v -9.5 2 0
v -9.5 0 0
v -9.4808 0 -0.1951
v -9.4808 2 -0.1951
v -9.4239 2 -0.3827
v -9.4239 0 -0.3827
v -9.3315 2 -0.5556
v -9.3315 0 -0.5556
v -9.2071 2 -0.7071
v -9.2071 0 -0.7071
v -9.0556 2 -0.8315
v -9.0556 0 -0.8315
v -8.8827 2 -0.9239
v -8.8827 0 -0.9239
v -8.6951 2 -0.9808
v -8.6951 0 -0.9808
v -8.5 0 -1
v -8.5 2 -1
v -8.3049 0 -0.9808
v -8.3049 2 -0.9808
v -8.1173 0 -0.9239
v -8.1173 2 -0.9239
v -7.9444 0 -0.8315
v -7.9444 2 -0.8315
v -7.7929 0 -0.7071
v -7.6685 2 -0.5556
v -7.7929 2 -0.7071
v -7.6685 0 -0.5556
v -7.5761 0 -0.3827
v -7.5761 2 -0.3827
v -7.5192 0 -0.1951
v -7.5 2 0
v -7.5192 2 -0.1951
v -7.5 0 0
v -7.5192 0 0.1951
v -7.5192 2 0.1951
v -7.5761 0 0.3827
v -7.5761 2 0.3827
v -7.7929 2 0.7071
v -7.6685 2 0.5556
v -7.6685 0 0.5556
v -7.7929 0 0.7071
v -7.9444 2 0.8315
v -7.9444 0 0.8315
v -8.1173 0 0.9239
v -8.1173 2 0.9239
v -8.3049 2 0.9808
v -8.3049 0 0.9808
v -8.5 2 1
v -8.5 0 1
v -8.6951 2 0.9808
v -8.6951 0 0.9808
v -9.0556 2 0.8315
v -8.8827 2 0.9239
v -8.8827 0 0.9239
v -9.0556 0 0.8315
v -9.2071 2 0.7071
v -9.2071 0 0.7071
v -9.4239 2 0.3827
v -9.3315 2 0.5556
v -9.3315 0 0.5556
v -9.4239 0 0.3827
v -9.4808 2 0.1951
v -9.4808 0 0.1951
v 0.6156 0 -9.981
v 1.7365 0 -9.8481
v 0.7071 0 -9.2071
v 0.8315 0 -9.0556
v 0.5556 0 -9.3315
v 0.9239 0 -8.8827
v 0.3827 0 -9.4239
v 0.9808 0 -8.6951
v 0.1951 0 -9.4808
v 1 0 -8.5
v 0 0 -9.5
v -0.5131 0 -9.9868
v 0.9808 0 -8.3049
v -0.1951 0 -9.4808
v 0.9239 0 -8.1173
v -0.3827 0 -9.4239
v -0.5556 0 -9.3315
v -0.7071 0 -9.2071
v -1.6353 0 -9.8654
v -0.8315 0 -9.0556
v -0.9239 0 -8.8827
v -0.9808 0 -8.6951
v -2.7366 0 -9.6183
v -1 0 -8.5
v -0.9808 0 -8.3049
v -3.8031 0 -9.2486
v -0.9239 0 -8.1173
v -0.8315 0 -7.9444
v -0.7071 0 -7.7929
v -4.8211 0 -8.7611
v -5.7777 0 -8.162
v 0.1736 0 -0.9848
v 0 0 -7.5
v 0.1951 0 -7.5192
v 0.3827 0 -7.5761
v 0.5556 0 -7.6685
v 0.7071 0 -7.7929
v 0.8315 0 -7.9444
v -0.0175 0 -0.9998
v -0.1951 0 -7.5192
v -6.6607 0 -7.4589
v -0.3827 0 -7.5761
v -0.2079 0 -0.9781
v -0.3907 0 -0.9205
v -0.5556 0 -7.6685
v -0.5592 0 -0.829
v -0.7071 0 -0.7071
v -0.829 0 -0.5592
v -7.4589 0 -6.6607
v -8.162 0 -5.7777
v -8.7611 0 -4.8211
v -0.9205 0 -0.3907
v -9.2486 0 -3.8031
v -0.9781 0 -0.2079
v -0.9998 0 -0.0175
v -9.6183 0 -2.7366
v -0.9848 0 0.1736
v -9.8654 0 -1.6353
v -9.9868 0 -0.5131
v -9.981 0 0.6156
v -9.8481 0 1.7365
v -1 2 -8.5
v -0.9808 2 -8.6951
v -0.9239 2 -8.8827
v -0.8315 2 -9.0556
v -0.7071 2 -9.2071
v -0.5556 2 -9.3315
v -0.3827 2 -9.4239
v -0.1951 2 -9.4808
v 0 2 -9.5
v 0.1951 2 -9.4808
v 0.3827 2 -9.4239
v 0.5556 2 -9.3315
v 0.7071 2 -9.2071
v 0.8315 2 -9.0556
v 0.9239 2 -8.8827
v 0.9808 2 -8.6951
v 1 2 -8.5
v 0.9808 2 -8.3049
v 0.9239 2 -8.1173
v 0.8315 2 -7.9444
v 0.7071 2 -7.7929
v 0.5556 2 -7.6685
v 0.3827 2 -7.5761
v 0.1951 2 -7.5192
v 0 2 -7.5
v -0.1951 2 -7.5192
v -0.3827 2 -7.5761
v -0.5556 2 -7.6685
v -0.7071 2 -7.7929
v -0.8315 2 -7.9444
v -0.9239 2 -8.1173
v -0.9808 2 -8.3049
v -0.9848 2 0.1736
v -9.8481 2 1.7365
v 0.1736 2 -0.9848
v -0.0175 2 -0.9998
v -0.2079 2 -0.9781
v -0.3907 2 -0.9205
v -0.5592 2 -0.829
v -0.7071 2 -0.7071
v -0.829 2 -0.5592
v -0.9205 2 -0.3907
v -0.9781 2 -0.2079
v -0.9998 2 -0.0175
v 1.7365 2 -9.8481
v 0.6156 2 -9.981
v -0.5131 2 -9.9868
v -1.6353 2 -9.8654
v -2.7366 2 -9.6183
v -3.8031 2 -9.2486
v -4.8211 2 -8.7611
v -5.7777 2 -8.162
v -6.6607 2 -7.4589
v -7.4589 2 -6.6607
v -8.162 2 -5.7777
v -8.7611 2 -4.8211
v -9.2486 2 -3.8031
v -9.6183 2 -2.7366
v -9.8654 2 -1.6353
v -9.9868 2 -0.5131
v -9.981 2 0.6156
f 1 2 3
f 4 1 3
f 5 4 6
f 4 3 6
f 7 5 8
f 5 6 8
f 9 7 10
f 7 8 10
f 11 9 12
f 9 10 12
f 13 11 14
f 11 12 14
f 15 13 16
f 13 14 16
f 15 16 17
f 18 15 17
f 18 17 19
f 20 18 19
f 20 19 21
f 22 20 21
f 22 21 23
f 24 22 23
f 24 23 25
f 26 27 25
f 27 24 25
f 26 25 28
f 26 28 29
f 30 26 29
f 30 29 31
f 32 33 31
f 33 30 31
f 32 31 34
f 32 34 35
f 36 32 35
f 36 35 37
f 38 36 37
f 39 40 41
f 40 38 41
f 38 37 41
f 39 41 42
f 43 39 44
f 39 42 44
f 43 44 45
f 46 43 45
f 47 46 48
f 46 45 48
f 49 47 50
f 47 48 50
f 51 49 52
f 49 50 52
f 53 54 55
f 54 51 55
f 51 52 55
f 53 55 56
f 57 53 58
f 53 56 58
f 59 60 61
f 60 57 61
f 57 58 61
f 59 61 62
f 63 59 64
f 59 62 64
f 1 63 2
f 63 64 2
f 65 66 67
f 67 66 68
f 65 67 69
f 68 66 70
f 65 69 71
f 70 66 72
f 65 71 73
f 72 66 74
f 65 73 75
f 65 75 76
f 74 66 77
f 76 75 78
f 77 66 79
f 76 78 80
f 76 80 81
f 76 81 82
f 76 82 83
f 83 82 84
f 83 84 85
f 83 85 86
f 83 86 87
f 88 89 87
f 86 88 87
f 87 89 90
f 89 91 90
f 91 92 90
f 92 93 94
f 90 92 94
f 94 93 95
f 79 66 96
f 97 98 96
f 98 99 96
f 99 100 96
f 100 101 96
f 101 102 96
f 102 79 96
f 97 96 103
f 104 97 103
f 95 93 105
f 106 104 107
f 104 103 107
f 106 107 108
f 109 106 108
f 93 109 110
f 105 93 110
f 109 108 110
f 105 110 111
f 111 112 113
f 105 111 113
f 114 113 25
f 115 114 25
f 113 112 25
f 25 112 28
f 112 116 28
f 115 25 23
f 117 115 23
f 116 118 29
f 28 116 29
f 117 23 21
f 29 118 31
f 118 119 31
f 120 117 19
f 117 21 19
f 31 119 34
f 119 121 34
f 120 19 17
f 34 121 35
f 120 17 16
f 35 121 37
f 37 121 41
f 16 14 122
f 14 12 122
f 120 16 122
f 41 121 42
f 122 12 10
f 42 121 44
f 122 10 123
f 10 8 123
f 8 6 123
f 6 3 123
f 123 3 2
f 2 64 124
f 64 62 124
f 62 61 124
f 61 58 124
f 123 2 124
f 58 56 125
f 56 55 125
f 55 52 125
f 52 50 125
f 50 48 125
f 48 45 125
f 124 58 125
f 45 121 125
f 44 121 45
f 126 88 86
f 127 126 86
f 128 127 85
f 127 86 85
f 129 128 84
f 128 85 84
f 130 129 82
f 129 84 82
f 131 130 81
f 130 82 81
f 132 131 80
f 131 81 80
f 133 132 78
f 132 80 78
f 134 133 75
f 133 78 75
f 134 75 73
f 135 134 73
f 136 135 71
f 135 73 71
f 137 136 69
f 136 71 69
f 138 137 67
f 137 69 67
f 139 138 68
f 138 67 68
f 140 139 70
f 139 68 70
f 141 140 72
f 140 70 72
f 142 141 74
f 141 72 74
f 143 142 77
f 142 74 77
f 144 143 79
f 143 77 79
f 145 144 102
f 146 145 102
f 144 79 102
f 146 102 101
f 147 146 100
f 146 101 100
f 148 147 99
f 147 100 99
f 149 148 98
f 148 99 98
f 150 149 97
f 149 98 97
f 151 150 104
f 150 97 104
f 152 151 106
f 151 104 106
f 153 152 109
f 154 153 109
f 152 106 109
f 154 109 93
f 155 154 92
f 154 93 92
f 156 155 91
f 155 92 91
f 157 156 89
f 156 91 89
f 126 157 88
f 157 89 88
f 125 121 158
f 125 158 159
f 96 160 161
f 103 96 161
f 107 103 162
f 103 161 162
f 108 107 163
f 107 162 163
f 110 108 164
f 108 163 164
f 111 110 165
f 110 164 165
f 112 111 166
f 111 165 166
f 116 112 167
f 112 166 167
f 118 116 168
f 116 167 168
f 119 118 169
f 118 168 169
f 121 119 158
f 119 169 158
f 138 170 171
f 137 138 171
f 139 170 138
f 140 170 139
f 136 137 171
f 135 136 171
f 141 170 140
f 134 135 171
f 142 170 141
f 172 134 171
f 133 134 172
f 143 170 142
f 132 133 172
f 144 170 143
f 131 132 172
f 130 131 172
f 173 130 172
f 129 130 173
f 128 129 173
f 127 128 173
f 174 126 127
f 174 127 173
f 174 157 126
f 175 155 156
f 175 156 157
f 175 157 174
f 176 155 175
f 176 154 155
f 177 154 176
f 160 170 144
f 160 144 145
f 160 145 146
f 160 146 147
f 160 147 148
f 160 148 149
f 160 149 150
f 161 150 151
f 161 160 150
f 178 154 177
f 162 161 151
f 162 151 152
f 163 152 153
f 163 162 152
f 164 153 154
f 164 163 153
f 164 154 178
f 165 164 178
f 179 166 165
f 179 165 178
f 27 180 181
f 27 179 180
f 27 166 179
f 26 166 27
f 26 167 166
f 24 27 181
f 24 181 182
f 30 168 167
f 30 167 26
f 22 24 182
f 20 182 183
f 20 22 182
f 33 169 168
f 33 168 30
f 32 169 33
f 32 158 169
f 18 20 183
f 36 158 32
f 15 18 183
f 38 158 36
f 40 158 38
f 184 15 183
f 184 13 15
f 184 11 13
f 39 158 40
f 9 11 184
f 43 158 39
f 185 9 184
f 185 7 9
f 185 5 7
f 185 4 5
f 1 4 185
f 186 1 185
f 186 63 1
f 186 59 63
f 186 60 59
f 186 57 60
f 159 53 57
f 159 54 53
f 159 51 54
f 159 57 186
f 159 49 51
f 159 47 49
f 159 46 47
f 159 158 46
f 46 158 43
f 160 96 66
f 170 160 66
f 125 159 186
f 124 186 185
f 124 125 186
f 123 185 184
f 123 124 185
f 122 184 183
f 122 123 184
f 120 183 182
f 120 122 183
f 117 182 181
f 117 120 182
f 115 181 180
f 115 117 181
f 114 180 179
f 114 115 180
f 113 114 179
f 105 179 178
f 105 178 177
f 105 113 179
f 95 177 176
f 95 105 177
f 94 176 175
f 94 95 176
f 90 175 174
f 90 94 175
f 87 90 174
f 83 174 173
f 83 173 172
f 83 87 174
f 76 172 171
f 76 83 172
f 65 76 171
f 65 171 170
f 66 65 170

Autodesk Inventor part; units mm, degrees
ref_plane "YZ Plane" through (0, 0, 0) normal (1, 0, 0) x (0, 1, 0)
ref_plane "XZ Plane" through (0, 0, 0) normal (0, 1, 0) x (-1, 0, 0)
ref_plane "XY Plane" through (0, 0, 0) normal (0, 0, 1) x (1, 0, 0)
sketch "Sketch1" plane through (0, 0, 0) normal (0, 1, 0) x (-1, 0, 0)
  circle A0 centre (0, 0) radius 10
  line L0 (0, 0) -> (9.8481, 1.7365)
  line L1 (0, 0) -> (10, 0) construction
  line L2 (0, 0) -> (-1.7365, -9.8481)
  line L3 (0, 0) -> (10, 0) construction
  line L4 (10, 0) -> (8.5, 0)
  circle A1 centre (8.5, 0) radius 1
  line L5 (0, -10) -> (0, -8.5)
  circle A2 centre (0, -8.5) radius 1
  dimension "d0" = 20
  dimension "d1" = 10
  dimension "d2" = 100
  dimension "d3" = 1.5
  dimension "d4" = 2
  dimension "d5" = 1.5
  dimension "d6" = 2
extrude "Extrusion1" add sketch "Sketch1" along normal blind 2 contours A0 L2 L0 picked at (2.2606, -5.1604)
sketch "Sketch2" plane through (0, 2, 0) normal (0, 1, 0) x (1, 0, 0)
  line L0 (0, 0) -> (1.7365, 9.8481) projected
  circle A0 centre (0, 0) radius 1
  dimension "d9" = 2
extrude "Extrusion2" cut sketch "Sketch2" against normal blind 4
properties part number "bell_crank_small_v1"
